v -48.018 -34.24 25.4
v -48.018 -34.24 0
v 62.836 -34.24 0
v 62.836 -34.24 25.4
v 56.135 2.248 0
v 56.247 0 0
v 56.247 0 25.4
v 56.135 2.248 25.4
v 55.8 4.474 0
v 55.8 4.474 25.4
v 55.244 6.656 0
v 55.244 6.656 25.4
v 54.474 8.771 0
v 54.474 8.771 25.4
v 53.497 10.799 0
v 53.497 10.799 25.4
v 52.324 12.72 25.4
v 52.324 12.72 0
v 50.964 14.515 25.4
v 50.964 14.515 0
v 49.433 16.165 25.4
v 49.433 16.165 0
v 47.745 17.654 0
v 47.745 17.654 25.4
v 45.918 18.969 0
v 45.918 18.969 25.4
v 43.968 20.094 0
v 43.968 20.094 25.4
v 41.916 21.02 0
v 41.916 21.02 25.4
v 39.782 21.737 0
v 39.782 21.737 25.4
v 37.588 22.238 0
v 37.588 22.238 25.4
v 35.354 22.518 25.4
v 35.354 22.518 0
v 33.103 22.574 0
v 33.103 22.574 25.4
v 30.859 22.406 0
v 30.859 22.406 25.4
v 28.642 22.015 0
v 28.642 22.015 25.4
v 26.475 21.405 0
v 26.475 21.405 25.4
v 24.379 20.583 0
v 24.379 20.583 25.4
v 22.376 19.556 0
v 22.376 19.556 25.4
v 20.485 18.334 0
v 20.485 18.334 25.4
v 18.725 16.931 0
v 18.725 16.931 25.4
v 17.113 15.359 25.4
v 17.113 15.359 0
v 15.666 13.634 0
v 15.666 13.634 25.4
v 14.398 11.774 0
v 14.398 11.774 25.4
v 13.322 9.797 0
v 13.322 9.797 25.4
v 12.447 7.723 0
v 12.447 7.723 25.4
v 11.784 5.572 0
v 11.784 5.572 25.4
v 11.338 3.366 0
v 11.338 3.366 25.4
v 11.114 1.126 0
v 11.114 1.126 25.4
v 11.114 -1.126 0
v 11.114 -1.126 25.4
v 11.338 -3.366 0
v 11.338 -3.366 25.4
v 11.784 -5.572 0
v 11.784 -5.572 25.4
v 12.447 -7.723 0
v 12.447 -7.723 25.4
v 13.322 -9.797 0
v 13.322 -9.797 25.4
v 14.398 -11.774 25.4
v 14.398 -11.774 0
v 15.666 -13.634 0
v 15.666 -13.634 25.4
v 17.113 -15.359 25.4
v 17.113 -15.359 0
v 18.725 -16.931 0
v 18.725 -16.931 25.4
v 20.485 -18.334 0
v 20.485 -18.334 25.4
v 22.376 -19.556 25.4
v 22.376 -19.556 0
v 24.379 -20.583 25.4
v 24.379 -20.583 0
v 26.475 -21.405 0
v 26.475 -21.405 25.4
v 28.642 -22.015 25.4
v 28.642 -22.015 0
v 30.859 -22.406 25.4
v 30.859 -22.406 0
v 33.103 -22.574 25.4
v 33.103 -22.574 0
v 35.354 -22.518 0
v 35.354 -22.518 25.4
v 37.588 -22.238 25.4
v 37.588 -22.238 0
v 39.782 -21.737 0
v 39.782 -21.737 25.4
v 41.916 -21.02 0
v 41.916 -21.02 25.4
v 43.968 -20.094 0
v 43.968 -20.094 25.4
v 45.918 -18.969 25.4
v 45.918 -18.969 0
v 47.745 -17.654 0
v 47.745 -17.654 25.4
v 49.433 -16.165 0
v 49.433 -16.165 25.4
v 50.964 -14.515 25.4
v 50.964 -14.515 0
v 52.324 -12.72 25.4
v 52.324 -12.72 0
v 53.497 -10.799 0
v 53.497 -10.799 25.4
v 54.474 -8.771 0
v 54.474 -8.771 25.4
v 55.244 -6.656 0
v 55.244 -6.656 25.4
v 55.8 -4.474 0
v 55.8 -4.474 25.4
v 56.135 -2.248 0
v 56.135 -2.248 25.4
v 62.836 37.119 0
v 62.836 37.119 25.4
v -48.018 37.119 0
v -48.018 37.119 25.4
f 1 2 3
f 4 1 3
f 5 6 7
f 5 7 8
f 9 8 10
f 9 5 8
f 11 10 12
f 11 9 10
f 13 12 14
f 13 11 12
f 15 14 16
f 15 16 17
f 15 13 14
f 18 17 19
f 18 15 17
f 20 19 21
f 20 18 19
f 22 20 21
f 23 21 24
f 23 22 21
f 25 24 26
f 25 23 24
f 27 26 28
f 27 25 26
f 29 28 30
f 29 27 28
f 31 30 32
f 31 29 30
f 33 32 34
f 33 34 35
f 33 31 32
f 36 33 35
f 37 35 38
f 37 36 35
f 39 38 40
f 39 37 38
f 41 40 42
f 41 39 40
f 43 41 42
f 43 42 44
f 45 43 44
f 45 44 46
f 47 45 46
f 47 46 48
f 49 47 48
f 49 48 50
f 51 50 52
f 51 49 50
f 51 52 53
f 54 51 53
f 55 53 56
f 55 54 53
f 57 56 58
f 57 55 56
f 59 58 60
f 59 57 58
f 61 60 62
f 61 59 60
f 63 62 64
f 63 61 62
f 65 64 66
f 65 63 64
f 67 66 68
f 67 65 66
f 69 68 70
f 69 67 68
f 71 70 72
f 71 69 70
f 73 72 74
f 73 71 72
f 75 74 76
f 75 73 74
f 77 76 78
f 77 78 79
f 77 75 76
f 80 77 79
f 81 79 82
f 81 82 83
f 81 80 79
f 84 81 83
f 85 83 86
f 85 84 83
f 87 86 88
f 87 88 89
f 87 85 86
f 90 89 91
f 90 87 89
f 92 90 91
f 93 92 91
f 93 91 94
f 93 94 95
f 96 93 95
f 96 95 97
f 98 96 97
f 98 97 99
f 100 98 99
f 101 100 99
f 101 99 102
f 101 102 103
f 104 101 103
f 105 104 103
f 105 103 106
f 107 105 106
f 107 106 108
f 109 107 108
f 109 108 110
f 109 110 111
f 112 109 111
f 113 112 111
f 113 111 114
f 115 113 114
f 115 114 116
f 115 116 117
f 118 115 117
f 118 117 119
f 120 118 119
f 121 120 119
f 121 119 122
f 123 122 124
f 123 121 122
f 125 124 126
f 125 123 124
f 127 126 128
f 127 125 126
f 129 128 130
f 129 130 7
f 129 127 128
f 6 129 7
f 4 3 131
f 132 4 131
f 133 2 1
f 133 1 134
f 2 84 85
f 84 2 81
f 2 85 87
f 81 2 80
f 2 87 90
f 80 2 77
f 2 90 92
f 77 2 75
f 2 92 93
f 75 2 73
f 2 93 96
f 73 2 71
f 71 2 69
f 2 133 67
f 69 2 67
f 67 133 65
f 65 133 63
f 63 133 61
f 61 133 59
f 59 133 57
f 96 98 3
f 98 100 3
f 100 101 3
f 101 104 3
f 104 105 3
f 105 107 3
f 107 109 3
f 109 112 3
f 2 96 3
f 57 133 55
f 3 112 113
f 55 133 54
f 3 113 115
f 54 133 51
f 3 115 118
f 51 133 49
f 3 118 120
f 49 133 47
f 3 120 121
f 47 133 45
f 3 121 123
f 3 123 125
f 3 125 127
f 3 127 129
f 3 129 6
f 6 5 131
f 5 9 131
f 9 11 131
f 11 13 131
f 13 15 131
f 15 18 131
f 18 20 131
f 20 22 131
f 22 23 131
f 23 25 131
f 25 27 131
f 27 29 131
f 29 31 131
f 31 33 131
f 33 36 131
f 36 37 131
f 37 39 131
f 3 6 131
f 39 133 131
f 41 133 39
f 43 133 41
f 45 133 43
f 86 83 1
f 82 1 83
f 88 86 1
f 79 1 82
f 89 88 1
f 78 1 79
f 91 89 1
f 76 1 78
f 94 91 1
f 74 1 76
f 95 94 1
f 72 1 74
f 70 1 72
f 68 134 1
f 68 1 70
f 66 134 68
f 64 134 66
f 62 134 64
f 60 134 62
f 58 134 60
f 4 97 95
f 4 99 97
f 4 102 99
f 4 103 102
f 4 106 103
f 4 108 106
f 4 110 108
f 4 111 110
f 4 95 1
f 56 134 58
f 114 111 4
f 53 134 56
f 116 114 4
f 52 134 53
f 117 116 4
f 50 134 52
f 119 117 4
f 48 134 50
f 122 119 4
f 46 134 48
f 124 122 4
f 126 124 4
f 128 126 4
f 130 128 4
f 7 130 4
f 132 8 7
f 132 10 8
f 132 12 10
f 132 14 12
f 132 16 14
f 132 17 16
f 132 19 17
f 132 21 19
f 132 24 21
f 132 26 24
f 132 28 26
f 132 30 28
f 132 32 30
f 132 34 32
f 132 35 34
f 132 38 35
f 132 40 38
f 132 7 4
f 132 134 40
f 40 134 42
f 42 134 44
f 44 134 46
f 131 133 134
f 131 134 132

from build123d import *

# Parameters (mm, degrees)
F0_W     = 110.8541414142
F0_H     = 71.3585466146
F2_DEPTH = 25.4
F1_R     = 22.5809105665


with BuildPart() as f2:
    # F0 (on Top) → F2 (new body)
    with BuildSketch(Plane.XY):
        with Locations((7.4085779488, 1.4397576451)):
            Rectangle(F0_W, F0_H)
    extrude(amount=F2_DEPTH)


with BuildPart() as f2b:
    # F1 (on Top) → F2, piece 2 (new body)
    with BuildSketch(Plane.XY):
        with Locations((33.6664095521, 0)):
            Circle(F1_R)
    extrude(amount=F2_DEPTH)


with BuildPart() as f2_1:
    add(f2.part)

    # F3: cut F2b
    add(f2b.part, mode=Mode.SUBTRACT)


solid = f2_1.part
